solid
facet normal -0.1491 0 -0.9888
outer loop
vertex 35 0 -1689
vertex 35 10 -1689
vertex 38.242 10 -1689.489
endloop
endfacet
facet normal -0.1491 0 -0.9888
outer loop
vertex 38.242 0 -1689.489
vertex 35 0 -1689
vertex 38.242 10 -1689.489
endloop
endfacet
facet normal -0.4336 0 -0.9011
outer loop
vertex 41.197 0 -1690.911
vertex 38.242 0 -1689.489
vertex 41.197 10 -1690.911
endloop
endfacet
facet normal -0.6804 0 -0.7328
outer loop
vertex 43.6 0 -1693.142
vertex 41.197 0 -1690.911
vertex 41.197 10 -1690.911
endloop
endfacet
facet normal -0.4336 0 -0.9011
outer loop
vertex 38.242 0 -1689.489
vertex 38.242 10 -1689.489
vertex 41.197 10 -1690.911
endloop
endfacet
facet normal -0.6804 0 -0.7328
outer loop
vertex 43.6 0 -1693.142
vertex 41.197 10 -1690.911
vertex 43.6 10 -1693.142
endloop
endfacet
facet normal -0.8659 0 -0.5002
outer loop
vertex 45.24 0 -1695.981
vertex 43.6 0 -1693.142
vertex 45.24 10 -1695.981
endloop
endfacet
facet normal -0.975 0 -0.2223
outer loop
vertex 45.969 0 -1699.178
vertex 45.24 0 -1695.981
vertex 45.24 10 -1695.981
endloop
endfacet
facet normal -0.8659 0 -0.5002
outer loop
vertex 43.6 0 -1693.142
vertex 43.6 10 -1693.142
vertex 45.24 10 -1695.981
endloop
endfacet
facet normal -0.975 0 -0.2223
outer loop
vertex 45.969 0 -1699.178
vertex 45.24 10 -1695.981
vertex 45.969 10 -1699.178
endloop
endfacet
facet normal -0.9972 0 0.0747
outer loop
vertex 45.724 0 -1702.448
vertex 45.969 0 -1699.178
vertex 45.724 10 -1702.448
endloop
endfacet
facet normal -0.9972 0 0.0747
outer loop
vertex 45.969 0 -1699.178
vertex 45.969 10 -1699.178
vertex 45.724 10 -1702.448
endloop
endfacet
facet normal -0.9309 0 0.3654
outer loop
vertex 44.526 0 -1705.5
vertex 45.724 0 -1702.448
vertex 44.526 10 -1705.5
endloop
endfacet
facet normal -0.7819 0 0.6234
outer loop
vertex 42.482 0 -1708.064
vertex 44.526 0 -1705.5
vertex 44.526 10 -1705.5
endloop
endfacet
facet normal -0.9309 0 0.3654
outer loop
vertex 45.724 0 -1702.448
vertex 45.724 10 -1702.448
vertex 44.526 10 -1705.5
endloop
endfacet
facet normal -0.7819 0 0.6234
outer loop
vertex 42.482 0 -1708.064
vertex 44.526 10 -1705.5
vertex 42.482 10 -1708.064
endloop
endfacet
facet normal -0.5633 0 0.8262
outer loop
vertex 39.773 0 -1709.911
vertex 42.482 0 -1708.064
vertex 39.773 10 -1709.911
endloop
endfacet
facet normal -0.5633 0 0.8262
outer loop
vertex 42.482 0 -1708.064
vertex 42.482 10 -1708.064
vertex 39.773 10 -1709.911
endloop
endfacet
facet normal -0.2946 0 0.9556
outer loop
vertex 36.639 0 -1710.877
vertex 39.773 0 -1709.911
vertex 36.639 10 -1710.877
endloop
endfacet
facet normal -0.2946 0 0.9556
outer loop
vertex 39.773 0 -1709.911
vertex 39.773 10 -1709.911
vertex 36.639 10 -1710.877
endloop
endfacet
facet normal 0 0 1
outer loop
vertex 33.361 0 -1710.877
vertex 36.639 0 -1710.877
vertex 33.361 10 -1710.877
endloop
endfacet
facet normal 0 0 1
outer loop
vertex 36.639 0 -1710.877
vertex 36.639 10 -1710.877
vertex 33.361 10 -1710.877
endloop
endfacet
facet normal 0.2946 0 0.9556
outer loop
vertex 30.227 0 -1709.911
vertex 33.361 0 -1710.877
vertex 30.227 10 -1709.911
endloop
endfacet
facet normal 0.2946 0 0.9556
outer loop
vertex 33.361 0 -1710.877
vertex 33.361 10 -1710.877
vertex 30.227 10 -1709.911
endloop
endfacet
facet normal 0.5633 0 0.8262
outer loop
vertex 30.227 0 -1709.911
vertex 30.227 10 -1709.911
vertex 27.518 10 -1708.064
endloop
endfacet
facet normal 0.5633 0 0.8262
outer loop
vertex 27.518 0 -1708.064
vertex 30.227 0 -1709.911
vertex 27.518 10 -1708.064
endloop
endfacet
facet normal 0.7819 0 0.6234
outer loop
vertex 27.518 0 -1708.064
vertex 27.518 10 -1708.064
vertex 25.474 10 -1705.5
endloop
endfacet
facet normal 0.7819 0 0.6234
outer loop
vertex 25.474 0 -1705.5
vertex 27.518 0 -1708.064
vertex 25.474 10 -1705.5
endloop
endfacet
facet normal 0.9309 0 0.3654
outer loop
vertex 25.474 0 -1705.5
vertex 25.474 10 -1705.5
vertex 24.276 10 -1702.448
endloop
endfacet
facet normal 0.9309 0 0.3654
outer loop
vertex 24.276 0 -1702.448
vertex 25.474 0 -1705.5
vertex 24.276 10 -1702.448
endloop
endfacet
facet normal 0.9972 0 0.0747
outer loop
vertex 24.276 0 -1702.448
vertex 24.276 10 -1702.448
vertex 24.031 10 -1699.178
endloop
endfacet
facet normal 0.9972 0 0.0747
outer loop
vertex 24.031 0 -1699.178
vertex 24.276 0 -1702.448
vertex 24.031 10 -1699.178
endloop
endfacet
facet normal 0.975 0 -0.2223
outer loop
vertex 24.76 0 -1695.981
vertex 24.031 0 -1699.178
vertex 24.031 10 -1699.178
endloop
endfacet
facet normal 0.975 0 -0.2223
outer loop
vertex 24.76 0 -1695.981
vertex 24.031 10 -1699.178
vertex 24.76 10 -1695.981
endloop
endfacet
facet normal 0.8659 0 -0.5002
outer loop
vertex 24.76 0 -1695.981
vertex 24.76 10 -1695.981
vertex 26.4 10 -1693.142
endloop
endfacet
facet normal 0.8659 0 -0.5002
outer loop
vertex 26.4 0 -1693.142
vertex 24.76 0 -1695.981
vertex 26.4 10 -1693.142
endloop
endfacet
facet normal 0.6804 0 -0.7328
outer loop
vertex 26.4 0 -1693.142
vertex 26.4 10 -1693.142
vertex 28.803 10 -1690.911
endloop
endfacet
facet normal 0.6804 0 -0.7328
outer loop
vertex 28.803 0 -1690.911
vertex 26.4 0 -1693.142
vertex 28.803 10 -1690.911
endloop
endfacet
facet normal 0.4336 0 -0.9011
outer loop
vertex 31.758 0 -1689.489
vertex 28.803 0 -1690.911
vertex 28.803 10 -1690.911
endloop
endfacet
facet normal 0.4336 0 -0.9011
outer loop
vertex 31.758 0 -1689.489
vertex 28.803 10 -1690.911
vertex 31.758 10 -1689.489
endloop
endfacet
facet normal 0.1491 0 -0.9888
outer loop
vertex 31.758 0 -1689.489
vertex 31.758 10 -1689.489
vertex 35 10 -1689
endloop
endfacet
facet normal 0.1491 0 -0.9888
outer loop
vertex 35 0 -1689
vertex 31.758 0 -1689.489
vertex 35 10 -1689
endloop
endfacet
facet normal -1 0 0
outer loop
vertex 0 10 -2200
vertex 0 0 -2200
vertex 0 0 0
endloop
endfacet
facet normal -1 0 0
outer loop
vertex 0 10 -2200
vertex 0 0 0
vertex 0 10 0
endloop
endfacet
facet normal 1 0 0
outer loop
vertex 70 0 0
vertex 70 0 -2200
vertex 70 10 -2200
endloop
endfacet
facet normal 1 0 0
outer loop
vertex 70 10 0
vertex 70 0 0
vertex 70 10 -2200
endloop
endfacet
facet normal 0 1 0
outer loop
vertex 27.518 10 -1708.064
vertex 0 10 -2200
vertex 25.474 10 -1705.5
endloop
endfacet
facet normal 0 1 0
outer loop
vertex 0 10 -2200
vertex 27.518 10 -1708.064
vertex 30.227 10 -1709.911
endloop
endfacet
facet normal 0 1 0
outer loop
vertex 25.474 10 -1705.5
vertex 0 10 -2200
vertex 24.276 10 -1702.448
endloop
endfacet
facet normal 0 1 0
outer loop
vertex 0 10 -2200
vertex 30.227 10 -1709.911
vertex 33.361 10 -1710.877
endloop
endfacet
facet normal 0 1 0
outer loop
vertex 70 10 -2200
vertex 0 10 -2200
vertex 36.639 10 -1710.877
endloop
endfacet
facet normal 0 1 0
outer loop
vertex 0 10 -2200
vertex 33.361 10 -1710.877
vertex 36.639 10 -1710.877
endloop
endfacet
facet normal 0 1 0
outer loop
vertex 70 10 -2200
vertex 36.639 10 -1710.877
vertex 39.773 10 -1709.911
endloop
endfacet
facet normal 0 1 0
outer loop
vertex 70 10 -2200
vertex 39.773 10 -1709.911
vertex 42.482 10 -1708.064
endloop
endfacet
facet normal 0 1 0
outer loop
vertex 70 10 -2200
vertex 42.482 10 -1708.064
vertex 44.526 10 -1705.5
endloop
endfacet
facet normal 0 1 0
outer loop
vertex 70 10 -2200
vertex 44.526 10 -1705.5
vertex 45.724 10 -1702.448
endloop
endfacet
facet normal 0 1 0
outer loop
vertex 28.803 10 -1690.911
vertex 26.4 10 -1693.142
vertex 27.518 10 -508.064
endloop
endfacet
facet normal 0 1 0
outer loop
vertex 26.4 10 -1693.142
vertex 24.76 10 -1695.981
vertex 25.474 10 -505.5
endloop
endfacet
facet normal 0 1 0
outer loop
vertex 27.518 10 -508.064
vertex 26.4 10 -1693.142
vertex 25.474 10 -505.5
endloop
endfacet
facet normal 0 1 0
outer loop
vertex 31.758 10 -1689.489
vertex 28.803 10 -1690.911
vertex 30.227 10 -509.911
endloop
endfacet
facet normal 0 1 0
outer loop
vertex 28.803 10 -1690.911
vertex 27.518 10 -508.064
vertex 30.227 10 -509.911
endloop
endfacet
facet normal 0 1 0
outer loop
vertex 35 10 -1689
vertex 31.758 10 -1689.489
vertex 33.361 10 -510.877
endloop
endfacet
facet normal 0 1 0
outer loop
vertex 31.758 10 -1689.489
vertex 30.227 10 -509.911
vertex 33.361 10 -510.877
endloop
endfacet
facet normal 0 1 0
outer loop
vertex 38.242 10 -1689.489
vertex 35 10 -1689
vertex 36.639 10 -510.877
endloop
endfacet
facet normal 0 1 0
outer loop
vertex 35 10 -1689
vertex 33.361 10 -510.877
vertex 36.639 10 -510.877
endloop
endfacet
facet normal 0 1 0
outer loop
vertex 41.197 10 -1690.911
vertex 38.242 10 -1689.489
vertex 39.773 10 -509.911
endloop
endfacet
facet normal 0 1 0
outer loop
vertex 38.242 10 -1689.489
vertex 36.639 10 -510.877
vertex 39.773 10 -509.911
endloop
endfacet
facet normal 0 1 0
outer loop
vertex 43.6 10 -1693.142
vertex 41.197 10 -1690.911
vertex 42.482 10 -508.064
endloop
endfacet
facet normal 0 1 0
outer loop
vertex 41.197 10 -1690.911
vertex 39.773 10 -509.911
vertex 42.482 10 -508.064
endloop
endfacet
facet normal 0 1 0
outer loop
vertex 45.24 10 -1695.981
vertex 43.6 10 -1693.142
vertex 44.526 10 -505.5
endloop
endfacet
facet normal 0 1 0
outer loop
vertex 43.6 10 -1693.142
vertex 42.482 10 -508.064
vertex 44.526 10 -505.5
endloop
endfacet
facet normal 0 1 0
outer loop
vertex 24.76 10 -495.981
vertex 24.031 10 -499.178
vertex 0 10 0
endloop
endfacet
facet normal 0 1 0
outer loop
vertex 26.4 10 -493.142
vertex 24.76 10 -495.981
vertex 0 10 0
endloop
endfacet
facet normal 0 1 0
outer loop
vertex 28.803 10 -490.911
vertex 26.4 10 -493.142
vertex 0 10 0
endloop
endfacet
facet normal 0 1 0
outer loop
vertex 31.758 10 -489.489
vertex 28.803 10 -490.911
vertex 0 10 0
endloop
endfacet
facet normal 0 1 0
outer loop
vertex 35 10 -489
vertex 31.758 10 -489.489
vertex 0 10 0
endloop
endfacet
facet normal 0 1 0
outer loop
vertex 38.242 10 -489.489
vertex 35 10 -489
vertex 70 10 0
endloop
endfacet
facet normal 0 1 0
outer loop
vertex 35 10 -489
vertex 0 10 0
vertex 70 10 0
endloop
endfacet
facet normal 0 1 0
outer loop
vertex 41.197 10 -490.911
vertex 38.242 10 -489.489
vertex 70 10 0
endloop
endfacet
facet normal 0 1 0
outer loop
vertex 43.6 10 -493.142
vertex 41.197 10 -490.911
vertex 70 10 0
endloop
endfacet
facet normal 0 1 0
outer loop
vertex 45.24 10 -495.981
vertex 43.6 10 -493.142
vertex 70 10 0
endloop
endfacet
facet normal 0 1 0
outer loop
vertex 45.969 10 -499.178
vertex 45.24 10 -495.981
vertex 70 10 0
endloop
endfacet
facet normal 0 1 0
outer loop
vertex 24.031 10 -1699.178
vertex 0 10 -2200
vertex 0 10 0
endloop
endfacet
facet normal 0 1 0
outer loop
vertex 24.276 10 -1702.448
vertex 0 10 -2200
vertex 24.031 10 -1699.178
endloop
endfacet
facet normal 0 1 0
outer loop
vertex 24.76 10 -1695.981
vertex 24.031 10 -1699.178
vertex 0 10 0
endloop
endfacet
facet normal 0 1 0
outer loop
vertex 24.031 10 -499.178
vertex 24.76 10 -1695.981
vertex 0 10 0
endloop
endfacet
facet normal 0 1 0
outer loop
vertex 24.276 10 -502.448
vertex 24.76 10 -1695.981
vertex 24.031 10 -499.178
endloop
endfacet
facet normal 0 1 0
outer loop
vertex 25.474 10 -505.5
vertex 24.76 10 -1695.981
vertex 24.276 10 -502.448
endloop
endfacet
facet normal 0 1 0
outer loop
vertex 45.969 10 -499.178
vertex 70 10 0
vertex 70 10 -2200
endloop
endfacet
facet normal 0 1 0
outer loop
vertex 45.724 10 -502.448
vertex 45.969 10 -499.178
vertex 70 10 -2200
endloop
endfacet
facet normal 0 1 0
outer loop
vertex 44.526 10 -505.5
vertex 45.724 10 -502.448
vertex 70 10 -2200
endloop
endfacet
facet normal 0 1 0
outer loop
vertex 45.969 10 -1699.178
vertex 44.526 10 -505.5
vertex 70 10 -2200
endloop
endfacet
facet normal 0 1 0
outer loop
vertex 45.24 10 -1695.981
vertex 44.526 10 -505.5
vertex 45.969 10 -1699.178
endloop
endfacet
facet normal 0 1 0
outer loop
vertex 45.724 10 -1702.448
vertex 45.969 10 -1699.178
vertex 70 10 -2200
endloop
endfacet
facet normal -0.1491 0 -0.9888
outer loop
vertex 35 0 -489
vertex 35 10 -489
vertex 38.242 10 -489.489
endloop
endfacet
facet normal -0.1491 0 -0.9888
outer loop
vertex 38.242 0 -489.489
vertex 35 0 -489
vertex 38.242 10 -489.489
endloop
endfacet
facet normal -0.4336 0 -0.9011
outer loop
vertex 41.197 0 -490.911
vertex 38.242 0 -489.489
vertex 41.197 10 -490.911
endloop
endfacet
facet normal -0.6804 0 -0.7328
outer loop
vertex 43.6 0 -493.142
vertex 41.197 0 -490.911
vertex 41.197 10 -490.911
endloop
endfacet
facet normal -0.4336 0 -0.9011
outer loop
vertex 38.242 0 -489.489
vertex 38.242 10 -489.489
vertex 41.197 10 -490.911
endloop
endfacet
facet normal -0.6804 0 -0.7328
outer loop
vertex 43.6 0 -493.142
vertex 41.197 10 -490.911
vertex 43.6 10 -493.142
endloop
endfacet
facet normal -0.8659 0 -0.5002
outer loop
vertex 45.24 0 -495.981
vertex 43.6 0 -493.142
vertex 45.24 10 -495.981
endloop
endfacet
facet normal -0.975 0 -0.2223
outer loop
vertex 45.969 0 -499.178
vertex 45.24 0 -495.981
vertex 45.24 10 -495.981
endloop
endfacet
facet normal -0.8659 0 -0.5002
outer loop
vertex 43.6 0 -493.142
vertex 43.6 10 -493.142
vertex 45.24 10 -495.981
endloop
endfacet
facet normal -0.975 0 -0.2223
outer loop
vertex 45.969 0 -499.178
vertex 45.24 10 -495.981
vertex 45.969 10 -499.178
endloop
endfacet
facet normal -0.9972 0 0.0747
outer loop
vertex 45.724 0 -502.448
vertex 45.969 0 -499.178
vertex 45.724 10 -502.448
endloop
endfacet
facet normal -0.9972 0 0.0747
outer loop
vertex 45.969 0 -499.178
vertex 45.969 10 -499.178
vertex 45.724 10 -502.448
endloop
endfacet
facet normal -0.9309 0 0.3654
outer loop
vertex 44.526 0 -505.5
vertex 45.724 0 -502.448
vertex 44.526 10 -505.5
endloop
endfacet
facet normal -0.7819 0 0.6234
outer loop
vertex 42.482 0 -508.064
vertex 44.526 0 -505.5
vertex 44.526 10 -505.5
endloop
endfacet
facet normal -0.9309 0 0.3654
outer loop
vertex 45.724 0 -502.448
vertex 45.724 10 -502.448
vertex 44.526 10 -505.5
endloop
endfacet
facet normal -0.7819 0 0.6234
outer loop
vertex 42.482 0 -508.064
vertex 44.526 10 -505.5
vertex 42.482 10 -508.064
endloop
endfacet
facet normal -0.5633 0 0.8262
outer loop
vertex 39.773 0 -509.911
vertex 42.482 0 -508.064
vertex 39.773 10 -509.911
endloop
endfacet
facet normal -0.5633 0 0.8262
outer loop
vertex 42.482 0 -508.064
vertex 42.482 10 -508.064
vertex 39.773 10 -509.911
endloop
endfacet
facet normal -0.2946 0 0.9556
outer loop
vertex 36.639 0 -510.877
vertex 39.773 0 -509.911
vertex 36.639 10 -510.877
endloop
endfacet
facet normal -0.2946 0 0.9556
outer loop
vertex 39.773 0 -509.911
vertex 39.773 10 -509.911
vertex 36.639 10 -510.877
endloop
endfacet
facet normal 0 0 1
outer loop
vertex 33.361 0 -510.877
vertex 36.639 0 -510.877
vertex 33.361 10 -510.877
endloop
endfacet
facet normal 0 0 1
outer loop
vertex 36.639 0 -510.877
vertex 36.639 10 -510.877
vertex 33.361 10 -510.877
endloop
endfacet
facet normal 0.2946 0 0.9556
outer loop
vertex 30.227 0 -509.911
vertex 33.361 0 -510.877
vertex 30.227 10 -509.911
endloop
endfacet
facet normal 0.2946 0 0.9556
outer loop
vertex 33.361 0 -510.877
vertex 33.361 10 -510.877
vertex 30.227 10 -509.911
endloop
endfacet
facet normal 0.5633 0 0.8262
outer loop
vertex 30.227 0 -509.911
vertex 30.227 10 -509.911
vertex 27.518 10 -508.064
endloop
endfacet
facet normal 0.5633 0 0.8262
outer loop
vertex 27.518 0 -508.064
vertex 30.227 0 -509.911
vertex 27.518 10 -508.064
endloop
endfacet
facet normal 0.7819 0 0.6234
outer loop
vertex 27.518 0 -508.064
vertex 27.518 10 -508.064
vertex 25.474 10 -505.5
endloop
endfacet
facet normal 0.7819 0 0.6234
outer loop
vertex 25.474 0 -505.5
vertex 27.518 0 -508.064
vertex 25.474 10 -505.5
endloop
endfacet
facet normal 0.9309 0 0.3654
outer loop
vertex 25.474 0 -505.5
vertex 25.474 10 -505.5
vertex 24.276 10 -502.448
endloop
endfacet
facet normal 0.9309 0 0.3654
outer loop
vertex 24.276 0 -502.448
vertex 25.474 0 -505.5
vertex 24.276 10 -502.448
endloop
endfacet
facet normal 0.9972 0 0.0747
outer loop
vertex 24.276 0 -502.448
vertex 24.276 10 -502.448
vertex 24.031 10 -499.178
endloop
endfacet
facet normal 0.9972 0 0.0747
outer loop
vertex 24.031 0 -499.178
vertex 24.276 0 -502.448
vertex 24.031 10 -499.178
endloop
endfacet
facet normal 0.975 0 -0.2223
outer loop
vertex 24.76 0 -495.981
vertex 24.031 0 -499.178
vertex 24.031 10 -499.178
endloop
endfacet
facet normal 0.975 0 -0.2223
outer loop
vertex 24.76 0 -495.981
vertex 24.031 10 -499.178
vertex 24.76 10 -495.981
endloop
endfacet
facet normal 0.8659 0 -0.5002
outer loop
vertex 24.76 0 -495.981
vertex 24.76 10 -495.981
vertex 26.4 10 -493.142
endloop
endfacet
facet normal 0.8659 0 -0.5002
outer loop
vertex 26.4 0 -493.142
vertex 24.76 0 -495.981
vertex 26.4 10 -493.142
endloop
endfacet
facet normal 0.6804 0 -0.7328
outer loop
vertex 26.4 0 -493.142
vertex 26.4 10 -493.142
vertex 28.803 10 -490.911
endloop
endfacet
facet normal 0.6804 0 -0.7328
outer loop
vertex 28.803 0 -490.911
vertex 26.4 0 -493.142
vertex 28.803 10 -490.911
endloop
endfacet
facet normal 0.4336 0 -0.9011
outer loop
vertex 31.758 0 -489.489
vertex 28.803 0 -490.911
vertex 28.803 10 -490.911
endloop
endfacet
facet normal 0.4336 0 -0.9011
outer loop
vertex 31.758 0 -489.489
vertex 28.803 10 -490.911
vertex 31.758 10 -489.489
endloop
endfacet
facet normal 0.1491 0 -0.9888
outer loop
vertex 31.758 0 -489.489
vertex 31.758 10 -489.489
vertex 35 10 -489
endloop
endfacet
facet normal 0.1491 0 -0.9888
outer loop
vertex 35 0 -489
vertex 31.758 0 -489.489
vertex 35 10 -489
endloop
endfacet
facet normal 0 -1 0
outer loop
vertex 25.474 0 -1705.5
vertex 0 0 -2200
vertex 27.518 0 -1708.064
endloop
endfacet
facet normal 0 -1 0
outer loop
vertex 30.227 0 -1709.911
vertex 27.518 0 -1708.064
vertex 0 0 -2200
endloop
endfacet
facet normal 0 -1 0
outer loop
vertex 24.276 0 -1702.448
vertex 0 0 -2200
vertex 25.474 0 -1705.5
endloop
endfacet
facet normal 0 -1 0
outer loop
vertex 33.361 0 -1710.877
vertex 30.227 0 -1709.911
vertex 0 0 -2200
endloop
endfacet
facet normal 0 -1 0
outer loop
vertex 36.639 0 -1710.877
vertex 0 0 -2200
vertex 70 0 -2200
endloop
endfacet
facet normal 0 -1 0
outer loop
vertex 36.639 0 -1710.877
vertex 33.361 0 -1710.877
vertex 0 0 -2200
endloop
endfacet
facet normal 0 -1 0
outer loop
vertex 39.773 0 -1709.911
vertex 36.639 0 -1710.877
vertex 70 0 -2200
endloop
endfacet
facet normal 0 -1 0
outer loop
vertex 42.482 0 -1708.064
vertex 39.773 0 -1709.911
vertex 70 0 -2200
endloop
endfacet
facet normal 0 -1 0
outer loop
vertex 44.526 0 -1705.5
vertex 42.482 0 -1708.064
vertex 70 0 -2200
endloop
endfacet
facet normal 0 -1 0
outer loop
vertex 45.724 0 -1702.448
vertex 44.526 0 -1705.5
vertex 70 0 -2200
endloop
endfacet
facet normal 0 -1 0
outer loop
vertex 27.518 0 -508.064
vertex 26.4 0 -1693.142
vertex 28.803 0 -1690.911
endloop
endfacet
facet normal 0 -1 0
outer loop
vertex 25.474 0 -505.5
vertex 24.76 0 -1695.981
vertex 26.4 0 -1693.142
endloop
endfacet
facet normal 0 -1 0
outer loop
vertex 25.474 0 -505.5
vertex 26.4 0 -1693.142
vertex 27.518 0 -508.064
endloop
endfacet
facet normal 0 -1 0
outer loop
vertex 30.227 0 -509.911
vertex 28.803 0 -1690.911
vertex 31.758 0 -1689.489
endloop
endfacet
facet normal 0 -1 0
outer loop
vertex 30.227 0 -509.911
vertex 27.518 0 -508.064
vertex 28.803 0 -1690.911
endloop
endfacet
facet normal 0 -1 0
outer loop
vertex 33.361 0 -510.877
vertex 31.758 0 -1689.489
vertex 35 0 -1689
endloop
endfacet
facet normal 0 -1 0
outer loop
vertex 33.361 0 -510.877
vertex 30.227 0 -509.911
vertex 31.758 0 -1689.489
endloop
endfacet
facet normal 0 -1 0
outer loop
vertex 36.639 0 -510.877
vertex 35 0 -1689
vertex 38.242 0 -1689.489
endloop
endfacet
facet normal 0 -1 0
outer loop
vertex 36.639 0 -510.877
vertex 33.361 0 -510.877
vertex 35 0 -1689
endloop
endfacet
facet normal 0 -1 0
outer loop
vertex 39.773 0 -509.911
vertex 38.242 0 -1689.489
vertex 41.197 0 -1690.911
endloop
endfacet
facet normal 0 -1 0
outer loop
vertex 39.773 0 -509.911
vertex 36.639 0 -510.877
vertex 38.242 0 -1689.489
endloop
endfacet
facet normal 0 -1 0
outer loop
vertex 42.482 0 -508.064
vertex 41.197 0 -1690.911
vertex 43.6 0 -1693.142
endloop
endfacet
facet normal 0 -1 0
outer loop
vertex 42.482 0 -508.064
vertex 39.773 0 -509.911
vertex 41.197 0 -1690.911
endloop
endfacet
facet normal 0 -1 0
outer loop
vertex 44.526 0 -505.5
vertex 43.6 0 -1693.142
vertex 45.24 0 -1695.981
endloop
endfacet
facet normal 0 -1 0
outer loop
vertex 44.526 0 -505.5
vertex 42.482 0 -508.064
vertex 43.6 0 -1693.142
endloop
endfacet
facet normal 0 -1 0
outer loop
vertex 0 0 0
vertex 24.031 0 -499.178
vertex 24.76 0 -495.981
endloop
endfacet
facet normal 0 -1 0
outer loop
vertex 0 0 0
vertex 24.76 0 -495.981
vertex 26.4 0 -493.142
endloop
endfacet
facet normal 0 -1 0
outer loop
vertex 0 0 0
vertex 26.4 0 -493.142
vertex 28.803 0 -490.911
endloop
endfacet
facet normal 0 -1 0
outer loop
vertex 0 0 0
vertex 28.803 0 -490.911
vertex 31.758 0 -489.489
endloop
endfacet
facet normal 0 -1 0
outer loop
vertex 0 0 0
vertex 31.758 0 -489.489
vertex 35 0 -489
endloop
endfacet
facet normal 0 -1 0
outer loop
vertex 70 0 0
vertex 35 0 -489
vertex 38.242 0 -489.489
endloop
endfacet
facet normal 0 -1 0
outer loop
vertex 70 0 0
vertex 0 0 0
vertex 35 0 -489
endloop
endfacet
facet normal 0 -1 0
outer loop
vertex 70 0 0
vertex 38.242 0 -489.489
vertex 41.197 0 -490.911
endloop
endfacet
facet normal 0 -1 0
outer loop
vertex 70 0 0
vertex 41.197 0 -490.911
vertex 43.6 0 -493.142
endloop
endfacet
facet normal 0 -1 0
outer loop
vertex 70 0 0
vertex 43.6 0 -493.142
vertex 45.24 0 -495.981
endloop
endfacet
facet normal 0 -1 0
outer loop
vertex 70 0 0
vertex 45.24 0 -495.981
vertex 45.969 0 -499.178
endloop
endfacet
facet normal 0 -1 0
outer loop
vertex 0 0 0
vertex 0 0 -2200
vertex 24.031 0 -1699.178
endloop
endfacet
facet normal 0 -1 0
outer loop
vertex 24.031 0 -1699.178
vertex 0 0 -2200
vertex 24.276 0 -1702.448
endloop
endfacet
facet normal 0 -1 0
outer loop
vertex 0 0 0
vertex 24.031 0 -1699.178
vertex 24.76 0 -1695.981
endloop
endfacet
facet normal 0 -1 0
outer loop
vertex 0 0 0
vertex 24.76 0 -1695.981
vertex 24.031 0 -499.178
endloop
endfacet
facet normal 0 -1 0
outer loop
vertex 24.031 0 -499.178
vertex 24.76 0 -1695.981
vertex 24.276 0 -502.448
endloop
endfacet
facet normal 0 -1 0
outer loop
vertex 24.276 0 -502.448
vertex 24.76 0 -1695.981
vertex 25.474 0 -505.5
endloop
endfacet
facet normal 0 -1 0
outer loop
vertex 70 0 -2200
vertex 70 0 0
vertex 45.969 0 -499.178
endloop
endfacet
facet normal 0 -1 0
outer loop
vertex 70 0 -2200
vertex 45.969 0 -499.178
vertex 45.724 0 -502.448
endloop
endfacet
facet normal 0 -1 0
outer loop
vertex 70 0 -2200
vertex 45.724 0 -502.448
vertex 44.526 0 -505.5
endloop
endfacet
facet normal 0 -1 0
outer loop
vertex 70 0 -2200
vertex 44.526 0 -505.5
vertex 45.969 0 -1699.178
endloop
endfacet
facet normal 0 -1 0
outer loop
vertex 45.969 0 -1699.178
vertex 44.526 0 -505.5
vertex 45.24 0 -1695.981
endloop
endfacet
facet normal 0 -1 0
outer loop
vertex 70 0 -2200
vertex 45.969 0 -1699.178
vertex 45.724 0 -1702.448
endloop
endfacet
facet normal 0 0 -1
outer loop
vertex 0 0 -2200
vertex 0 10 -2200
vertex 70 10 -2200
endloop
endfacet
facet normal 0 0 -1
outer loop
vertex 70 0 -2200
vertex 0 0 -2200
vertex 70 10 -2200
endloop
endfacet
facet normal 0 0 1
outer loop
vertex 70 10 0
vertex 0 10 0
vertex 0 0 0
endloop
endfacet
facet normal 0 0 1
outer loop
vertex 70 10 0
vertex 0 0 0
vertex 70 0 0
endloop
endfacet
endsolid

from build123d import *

# Parameters (mm, degrees)
SKETCH_1_W          = 70
SKETCH_1_H          = 10
EXTRUDE_1_DEPTH     = 2200
SKETCH_2_R          = 11
CUT_EXTRUDE_1_DEPTH = 2202.136070306


with BuildPart() as part:
    # 草图1 → 凸台-拉伸1 (new body)
    with BuildSketch(Plane.XY):
        with Locations((35, 5)):
            Rectangle(SKETCH_1_W, SKETCH_1_H)
    extrude(amount=-EXTRUDE_1_DEPTH)

    # 草图2 → 切除-拉伸1 (cut, through all)
    with BuildSketch(Plane(origin=(0, 10, 0), x_dir=(1, 0, 0), z_dir=(0, 1, 0))):
        with Locations(Location((35, 1700, 0), (0, 0, 270))):
            Circle(SKETCH_2_R)
        with Locations(Location((35, 500, 0), (0, 0, 270))):
            Circle(SKETCH_2_R)
    extrude(amount=-CUT_EXTRUDE_1_DEPTH, mode=Mode.SUBTRACT)


solid = part.part
